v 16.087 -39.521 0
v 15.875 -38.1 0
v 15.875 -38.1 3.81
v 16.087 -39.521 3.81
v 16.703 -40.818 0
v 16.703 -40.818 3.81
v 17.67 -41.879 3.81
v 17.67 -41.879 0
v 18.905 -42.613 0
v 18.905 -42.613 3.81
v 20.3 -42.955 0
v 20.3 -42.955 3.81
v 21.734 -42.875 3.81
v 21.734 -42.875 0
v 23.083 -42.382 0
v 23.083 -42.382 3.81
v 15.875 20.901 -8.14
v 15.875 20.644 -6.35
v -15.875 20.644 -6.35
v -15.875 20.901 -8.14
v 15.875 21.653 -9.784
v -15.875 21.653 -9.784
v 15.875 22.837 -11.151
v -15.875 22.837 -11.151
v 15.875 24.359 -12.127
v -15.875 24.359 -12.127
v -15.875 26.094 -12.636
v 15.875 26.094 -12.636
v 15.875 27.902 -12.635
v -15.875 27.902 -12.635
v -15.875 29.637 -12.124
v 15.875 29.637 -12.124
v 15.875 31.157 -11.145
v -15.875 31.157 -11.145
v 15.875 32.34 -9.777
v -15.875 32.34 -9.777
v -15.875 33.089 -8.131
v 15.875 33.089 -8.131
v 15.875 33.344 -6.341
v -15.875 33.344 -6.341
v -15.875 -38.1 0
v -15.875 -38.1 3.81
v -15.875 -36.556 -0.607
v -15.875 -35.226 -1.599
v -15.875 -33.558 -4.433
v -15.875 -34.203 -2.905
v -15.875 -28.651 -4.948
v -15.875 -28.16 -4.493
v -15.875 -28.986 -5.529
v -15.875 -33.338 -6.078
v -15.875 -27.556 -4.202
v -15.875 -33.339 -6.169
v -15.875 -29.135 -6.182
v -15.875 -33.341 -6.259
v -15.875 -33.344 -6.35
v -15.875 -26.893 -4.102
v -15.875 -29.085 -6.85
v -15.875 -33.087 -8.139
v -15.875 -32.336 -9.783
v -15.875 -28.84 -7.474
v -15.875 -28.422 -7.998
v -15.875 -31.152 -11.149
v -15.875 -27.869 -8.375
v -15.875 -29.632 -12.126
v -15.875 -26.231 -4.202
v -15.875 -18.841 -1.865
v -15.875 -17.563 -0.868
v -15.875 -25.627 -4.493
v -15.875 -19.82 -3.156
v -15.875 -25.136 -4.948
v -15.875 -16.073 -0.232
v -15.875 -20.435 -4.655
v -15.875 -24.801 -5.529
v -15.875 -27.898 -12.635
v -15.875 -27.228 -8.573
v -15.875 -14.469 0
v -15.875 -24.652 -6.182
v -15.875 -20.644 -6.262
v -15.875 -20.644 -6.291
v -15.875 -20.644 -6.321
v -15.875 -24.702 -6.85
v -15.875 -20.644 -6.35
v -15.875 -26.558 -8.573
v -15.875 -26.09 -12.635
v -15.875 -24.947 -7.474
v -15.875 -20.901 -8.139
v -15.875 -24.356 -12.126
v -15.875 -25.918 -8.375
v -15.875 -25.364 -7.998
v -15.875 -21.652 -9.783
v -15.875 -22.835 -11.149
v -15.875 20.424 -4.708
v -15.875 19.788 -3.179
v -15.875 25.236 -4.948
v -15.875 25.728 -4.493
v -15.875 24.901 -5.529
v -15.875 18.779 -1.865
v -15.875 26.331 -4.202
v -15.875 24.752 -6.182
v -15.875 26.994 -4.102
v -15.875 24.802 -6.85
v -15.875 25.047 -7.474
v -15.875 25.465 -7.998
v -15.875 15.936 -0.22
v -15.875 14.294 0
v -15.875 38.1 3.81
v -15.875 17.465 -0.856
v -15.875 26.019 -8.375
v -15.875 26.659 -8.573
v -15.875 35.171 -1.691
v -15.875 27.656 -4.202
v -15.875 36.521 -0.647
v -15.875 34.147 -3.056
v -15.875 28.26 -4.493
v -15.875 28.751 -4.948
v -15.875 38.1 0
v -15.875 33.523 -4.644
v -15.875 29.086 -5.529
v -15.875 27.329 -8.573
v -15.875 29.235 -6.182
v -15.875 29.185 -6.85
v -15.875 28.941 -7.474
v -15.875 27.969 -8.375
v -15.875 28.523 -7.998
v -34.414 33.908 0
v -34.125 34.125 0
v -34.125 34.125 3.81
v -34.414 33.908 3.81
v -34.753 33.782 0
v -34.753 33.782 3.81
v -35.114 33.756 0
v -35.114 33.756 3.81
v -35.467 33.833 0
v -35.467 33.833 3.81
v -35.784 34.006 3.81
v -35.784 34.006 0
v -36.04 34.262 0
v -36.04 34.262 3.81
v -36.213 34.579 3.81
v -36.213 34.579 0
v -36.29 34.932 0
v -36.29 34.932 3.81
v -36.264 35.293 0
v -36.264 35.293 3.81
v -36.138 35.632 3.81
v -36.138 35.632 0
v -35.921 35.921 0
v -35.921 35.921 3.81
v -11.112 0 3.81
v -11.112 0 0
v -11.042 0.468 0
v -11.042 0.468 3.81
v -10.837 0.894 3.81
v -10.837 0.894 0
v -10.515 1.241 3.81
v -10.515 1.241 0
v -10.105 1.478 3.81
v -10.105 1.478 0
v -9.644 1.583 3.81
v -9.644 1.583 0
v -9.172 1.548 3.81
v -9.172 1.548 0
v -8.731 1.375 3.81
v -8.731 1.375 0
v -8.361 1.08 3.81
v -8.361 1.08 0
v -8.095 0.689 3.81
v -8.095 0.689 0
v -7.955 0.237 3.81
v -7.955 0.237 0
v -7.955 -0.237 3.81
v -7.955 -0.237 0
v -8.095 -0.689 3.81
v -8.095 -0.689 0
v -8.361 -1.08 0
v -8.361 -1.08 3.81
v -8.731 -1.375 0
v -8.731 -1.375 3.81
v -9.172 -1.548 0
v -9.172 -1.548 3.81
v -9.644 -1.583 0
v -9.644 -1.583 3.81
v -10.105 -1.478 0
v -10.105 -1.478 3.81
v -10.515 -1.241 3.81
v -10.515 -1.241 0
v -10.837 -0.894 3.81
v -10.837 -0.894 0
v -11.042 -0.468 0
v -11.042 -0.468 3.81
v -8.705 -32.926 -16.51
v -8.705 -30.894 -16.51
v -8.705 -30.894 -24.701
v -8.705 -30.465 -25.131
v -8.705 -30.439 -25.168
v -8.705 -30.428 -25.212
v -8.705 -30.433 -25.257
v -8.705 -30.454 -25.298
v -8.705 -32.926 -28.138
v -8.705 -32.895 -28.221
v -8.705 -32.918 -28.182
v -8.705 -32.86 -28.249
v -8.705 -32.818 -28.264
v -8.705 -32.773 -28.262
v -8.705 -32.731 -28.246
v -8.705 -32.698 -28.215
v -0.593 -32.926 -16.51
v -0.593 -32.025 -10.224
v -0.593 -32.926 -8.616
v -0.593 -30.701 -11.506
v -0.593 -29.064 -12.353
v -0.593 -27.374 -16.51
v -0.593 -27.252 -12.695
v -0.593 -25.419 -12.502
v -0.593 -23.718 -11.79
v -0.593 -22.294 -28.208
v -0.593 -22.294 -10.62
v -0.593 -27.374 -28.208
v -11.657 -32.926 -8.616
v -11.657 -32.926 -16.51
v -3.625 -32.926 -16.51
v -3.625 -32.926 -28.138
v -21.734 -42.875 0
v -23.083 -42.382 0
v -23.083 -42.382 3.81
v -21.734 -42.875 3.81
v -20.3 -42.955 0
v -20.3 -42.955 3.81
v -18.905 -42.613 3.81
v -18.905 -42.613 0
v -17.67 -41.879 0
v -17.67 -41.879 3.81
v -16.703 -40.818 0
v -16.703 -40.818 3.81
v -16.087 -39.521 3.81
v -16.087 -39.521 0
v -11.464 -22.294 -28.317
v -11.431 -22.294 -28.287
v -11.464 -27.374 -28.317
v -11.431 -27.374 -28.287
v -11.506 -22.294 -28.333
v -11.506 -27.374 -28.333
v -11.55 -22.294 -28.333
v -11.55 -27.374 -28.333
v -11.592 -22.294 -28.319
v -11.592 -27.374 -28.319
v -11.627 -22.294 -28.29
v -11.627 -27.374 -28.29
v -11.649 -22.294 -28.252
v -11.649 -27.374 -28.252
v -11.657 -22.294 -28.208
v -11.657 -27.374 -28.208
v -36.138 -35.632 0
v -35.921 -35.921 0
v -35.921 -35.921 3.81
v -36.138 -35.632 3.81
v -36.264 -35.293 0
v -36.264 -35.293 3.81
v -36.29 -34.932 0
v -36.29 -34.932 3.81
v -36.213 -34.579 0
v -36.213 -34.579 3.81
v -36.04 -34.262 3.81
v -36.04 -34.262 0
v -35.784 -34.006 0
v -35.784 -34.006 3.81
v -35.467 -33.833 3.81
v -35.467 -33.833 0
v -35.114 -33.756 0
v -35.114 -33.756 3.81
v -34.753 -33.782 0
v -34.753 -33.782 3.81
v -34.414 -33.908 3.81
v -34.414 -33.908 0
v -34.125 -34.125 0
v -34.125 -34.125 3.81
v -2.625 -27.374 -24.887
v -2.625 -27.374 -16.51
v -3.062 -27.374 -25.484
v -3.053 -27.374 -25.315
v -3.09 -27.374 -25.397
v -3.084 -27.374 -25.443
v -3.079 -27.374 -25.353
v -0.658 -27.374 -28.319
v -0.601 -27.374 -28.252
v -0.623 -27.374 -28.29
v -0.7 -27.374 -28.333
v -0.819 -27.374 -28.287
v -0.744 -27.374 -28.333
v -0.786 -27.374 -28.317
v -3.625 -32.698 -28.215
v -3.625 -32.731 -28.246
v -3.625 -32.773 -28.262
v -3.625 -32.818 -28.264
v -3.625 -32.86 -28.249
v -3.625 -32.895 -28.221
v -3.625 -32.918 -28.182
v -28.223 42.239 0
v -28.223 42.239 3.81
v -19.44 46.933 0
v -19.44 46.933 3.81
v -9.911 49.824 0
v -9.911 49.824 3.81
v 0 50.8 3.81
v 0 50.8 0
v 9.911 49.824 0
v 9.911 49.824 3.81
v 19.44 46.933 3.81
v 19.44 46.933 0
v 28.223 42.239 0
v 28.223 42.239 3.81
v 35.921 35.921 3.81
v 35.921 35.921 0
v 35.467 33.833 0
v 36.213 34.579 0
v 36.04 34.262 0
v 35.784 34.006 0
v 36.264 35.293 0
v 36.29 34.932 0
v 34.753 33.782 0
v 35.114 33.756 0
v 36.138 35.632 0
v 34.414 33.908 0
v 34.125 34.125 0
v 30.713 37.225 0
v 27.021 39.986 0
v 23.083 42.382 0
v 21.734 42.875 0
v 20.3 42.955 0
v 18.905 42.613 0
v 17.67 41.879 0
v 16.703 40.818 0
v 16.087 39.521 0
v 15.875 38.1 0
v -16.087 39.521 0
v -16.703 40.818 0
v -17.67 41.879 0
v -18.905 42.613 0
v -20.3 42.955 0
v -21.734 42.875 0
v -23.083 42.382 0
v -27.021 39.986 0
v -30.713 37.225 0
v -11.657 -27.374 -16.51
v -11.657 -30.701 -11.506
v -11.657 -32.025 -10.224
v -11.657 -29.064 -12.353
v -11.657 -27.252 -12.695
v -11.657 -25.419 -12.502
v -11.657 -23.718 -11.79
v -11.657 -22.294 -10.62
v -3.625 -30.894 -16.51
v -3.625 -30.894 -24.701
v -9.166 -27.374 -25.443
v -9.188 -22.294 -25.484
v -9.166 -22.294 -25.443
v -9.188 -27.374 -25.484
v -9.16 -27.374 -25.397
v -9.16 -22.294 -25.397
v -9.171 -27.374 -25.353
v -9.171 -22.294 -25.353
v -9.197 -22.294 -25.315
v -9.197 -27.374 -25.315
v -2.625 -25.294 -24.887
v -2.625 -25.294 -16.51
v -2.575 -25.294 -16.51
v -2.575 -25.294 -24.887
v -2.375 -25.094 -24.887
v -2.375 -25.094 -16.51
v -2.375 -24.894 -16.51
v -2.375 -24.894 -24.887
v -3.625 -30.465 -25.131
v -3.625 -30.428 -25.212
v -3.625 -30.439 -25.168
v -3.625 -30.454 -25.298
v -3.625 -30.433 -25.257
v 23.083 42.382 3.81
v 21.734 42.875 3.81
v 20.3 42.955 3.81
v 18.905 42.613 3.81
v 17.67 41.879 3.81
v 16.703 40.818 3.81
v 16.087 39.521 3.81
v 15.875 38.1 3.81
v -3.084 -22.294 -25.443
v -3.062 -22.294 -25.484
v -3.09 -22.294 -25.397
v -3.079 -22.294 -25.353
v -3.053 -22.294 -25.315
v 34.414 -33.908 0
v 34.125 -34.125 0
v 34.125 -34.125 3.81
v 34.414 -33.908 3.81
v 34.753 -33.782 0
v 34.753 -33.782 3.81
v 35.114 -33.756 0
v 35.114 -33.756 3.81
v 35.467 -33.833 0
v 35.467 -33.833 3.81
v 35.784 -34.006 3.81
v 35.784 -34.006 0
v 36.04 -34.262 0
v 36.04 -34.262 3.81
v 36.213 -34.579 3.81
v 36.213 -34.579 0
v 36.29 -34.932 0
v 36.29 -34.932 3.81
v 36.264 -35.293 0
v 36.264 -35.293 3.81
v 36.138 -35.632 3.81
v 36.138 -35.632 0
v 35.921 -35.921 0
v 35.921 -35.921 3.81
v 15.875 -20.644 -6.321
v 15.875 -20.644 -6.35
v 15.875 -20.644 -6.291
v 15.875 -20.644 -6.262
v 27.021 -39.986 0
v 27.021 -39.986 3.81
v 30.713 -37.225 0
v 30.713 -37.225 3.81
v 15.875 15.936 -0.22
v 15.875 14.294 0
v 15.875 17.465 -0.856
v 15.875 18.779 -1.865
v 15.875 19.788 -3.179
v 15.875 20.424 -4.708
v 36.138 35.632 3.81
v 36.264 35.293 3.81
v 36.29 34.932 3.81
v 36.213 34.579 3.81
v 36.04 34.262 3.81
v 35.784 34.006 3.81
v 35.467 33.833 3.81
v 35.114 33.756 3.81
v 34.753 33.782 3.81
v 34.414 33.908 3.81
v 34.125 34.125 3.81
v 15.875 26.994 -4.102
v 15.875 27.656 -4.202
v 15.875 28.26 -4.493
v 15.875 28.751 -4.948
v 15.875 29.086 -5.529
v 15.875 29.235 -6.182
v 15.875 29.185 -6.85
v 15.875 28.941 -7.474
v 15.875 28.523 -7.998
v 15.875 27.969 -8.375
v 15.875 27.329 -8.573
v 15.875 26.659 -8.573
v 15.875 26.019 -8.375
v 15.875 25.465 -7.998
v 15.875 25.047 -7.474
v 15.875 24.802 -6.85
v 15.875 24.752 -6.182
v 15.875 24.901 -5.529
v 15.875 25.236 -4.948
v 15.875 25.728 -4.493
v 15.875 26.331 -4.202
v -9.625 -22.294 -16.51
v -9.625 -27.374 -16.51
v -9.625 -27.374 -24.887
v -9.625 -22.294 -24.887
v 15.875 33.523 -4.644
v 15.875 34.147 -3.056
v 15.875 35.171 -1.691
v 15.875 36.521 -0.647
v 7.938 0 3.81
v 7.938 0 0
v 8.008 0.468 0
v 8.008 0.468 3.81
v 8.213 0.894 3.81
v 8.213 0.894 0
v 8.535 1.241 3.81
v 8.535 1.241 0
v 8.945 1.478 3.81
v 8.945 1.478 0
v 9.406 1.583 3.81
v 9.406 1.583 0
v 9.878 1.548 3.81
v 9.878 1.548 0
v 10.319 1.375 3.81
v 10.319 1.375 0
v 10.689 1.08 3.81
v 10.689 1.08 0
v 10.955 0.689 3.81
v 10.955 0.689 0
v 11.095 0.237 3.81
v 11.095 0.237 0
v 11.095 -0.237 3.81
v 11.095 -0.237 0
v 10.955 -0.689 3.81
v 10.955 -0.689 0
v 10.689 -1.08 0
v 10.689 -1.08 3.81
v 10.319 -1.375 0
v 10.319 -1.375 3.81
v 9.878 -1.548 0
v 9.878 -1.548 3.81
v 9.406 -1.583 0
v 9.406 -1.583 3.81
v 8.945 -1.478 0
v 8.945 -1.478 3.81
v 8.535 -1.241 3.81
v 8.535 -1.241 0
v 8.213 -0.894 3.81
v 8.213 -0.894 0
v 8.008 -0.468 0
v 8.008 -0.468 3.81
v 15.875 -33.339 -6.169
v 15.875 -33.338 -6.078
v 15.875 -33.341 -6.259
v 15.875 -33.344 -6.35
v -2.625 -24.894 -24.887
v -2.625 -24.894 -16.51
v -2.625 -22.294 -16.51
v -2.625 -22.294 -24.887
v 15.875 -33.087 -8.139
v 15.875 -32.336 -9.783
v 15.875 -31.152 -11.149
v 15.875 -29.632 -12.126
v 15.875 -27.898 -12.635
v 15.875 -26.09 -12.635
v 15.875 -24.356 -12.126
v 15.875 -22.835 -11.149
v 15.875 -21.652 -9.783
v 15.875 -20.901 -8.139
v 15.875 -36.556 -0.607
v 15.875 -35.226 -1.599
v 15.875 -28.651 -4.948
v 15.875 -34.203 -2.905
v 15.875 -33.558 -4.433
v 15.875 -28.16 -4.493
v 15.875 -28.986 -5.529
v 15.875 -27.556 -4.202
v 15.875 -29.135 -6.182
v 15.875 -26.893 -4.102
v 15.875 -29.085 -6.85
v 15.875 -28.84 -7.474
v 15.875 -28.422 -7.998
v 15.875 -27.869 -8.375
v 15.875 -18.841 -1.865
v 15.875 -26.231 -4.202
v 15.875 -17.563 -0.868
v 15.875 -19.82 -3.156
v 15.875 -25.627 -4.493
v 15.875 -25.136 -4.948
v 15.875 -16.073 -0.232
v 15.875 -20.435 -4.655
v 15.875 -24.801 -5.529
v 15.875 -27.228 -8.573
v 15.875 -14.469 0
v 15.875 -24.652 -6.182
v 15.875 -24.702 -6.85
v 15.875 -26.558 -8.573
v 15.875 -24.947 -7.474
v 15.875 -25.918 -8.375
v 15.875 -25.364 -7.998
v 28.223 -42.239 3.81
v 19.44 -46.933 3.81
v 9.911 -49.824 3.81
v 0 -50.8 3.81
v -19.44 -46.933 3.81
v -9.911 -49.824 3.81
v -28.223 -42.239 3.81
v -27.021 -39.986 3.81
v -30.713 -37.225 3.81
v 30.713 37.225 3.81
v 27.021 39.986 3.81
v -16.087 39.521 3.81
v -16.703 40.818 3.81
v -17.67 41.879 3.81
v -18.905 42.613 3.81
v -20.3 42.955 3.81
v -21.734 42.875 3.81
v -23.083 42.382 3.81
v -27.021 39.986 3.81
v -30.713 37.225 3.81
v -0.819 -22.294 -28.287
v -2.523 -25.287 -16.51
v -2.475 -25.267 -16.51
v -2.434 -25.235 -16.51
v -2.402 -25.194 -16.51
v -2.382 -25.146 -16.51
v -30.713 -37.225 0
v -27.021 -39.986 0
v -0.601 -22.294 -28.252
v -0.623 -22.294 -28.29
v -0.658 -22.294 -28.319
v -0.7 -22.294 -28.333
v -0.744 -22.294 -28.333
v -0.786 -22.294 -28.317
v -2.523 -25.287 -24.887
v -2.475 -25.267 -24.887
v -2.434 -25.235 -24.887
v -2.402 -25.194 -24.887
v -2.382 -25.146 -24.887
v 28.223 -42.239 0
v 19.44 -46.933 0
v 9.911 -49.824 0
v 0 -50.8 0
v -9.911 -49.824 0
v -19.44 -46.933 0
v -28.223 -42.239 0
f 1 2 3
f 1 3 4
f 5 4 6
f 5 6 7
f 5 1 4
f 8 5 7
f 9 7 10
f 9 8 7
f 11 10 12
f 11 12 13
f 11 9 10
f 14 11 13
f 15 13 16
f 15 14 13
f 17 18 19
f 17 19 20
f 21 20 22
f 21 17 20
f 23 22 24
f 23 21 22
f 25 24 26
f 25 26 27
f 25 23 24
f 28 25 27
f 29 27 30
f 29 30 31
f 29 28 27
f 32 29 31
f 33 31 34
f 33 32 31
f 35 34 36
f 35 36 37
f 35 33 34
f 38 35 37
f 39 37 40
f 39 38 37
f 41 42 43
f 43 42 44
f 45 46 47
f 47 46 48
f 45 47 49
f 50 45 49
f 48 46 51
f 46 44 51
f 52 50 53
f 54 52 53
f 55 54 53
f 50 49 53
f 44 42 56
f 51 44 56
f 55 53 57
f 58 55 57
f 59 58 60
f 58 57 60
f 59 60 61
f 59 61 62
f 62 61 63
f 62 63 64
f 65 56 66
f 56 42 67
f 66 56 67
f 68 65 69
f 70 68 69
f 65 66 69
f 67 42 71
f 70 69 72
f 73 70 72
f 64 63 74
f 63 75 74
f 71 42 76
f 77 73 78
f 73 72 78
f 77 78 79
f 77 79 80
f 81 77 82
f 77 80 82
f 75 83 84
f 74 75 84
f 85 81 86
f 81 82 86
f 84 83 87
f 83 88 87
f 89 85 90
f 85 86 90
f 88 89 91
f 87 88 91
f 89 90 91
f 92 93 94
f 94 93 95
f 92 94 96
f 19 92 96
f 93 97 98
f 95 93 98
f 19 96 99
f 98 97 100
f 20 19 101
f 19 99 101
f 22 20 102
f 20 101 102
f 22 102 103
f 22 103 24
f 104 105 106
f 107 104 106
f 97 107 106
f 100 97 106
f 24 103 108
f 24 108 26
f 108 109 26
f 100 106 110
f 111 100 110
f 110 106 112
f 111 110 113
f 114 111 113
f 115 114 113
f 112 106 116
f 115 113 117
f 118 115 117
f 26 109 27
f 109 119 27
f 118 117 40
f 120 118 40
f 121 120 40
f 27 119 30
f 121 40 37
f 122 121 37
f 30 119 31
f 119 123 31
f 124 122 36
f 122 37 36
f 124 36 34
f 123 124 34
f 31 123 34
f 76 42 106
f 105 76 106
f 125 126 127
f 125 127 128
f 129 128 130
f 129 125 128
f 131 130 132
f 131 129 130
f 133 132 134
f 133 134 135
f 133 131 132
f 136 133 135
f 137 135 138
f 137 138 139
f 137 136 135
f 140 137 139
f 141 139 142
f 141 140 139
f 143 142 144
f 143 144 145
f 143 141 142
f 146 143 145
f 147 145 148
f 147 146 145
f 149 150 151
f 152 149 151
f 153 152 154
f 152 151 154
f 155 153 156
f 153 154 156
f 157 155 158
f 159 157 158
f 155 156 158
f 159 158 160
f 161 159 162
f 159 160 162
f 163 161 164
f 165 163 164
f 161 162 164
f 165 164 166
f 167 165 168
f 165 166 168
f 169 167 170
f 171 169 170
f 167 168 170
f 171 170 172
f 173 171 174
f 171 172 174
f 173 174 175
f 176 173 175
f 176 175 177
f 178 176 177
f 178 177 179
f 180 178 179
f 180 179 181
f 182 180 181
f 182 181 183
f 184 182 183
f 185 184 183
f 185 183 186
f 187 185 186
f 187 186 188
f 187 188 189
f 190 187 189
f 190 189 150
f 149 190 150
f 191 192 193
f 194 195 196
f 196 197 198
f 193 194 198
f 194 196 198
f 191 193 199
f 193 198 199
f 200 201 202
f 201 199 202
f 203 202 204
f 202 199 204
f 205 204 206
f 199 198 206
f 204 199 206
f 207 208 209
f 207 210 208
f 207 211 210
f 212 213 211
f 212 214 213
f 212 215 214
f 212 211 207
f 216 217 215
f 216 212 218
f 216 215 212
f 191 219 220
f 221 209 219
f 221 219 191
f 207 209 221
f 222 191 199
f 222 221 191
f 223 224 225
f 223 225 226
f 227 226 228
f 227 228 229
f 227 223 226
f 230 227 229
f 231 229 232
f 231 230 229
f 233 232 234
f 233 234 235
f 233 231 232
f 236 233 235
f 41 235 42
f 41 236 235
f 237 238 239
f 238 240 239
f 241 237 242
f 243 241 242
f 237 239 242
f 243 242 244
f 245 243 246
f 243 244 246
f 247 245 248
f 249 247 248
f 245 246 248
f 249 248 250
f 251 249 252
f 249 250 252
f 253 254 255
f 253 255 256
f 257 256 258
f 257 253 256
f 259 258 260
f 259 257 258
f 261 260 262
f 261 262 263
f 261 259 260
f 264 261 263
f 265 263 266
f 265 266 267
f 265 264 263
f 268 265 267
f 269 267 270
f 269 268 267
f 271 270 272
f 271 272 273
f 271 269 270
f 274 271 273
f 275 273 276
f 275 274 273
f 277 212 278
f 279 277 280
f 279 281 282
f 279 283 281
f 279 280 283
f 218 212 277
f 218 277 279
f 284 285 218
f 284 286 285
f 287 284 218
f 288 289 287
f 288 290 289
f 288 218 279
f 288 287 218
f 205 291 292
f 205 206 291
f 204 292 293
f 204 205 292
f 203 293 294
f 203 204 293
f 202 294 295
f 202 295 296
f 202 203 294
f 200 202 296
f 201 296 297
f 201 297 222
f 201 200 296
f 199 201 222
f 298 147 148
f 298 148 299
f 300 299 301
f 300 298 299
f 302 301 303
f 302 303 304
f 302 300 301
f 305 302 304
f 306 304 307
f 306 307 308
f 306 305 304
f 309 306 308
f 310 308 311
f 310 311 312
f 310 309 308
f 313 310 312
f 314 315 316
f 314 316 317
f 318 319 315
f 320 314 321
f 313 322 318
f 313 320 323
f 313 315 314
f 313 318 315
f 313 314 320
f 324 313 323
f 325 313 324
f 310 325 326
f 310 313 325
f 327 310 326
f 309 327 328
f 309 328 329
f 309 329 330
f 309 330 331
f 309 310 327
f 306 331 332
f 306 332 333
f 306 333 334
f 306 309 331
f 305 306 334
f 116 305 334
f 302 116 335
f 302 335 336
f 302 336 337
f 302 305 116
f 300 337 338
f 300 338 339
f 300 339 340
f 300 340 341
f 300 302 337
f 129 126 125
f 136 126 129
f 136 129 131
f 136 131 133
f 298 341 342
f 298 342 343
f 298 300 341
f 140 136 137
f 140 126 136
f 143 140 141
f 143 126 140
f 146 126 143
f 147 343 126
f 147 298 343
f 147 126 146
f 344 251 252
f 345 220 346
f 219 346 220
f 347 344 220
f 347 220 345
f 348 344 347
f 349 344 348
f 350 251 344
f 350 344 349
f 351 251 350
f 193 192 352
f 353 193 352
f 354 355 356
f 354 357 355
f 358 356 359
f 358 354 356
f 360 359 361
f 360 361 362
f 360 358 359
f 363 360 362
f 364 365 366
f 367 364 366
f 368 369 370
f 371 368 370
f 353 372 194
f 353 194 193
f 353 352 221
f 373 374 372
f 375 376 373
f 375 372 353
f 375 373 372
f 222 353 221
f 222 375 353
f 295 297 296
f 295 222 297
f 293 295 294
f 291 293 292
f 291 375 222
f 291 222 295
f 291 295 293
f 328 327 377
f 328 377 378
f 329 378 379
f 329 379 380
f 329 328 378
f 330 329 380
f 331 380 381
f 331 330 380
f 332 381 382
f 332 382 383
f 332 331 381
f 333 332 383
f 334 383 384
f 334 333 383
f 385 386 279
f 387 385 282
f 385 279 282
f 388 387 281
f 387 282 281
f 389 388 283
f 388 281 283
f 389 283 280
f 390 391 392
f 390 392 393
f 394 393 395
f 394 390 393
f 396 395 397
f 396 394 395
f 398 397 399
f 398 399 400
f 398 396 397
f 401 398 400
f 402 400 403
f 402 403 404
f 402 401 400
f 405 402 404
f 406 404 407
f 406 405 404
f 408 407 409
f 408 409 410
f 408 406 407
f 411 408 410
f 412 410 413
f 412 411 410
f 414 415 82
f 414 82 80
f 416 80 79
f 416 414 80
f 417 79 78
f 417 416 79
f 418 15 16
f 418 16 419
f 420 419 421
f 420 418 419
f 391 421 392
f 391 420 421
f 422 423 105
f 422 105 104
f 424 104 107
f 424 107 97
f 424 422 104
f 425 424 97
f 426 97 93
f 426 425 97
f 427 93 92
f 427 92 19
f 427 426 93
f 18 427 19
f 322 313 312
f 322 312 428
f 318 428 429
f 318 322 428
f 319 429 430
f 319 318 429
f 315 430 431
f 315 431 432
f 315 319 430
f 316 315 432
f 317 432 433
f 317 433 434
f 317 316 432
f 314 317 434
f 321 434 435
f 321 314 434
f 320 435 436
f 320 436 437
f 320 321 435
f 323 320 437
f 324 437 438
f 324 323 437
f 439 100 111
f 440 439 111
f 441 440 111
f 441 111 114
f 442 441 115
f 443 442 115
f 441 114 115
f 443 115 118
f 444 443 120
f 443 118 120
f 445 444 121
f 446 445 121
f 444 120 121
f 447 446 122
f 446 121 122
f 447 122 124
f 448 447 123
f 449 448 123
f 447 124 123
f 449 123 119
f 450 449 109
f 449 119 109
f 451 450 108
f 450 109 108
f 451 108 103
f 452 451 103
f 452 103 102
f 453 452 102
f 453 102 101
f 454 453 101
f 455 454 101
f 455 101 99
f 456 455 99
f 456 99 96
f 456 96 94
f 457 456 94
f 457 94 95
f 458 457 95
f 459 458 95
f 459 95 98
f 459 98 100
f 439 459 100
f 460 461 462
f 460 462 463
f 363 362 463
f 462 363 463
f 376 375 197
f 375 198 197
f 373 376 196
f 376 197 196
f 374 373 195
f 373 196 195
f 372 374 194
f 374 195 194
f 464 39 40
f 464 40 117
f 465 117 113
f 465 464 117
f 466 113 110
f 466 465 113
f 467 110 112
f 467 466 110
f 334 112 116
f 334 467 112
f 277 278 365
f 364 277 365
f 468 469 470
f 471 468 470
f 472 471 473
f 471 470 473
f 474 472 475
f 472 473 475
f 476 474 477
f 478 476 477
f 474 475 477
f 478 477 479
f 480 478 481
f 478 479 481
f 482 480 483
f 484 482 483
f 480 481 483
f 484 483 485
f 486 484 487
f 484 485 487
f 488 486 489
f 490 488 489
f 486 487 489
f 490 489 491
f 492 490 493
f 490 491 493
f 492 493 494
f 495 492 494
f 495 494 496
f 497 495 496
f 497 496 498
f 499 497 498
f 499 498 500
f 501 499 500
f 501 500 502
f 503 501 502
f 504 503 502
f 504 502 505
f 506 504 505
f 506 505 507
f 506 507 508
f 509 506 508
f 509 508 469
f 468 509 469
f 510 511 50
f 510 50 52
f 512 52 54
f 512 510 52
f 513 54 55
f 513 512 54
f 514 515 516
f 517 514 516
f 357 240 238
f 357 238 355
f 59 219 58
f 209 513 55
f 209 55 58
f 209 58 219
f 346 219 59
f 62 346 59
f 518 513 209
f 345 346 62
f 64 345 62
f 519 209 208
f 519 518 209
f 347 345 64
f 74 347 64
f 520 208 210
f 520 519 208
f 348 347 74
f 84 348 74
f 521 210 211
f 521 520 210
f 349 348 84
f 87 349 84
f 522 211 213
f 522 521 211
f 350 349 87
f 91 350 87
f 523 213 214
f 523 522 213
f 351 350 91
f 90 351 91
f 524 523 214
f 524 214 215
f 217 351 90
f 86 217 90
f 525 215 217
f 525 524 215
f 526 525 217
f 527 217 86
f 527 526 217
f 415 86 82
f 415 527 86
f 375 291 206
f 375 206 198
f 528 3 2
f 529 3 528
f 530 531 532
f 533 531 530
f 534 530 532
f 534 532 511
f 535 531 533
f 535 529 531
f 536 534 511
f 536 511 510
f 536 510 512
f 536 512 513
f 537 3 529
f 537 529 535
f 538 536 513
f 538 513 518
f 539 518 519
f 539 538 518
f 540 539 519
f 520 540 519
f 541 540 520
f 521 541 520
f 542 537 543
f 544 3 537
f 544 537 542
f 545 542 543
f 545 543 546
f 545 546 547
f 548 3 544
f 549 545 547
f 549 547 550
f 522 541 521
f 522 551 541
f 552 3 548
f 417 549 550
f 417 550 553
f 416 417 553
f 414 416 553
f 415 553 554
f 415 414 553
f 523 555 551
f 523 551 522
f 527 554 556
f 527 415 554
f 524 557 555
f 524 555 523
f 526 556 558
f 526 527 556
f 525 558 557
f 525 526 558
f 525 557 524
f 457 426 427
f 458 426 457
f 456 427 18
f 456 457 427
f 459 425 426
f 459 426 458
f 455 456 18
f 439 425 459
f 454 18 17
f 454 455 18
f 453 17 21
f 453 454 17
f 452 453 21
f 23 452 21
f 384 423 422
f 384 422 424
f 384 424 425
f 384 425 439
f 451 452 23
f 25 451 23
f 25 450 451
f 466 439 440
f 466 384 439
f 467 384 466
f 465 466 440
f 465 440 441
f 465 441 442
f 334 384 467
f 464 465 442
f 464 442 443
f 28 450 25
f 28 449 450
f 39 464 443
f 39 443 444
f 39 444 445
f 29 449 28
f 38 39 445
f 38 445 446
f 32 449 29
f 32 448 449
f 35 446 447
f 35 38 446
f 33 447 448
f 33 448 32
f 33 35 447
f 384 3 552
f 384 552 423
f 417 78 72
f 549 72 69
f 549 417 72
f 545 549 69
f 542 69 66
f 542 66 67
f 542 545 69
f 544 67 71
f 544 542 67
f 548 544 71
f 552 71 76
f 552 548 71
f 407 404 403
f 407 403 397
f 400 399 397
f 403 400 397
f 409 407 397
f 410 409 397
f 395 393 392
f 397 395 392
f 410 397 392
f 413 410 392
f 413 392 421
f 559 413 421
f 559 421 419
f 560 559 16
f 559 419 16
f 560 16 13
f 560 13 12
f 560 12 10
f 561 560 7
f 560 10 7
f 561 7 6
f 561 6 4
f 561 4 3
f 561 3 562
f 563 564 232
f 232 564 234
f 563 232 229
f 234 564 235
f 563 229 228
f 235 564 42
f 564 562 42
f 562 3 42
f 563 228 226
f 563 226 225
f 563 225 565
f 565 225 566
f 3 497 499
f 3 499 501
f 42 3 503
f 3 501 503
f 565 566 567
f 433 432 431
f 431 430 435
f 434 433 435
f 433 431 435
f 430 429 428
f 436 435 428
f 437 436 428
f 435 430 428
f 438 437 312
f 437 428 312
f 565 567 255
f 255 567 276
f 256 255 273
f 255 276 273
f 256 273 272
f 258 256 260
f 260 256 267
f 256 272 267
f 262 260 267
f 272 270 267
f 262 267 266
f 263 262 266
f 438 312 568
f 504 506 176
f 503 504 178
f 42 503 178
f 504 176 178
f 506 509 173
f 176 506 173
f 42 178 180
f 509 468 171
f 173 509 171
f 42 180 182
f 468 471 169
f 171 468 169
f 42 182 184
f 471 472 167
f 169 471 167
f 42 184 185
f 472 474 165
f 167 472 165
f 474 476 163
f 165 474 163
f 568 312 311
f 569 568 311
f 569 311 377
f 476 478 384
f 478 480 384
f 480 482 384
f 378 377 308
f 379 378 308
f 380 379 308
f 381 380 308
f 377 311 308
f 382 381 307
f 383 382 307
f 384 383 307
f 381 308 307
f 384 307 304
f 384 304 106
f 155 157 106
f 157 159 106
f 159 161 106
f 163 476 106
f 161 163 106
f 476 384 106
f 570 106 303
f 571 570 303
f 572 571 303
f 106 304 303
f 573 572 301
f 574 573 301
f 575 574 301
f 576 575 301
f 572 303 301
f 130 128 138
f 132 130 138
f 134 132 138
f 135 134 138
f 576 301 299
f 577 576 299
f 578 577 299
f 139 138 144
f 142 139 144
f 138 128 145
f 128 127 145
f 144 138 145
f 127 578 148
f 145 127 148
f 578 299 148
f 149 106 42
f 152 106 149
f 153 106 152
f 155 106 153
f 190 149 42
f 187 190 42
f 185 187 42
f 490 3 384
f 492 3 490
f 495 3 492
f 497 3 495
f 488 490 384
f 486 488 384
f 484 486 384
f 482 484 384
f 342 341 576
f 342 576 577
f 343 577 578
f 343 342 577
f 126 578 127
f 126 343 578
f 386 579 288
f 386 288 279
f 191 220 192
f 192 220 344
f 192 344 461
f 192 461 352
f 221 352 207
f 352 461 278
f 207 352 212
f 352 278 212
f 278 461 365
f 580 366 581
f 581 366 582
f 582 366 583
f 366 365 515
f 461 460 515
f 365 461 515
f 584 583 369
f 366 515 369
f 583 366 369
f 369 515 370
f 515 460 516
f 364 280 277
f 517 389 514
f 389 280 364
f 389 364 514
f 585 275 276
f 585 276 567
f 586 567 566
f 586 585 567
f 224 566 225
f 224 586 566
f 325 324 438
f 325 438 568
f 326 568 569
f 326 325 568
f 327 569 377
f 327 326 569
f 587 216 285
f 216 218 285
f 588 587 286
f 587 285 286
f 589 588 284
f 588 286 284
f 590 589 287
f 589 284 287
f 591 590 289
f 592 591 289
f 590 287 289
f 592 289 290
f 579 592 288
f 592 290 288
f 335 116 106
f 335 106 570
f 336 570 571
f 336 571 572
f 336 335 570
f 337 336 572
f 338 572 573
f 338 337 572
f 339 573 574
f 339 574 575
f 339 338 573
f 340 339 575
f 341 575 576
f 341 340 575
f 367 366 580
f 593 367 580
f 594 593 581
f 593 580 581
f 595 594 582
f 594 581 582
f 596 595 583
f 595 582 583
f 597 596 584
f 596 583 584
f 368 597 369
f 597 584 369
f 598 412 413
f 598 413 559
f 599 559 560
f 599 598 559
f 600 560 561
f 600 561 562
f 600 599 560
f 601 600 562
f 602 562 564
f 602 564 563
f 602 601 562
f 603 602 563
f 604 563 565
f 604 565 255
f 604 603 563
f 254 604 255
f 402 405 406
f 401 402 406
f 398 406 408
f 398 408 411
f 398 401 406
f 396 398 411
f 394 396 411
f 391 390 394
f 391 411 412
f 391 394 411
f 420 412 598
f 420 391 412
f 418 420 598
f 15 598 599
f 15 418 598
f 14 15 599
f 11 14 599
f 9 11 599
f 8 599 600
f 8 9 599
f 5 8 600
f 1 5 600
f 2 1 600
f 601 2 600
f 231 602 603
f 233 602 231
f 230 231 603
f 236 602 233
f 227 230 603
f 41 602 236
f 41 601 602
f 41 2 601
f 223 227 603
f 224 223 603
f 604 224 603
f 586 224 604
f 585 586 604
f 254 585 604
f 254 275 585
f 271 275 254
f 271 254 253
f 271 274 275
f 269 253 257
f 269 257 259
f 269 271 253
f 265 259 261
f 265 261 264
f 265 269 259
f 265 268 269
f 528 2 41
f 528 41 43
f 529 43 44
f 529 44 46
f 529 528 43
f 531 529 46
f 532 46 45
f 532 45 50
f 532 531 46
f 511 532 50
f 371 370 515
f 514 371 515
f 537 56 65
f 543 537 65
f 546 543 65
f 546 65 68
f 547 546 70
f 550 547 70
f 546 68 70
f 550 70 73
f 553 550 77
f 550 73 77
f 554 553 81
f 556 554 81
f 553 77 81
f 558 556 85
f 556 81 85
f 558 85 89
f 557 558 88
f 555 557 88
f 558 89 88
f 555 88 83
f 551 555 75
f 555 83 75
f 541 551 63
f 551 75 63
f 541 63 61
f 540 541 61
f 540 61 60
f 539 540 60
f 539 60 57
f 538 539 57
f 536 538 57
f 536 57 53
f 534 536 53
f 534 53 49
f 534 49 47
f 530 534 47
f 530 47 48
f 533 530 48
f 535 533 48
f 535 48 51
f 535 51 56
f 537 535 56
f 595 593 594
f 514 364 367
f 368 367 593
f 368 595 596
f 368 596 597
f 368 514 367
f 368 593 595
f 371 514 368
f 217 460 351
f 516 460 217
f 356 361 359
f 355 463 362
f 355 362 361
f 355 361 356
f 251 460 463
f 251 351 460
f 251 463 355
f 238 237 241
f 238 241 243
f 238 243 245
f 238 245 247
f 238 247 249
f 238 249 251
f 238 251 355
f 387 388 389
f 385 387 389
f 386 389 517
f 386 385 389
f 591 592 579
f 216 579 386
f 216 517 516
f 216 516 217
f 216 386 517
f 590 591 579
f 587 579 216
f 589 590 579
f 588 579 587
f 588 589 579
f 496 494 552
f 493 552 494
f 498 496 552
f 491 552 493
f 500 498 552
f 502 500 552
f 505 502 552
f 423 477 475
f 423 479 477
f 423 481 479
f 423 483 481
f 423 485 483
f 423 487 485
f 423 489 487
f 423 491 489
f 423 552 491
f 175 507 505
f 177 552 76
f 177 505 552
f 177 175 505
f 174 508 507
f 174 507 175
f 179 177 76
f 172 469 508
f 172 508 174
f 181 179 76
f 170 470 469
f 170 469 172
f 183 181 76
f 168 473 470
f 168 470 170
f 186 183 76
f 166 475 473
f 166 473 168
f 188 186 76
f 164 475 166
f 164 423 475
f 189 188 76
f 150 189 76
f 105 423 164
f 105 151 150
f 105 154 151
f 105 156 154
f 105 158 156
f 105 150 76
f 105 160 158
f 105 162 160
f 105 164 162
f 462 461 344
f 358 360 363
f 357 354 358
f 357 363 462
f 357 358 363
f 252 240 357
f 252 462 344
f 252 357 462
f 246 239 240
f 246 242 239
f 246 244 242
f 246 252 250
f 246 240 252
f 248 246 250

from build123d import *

# Parameters (mm, degrees)
BOSS_EXTRUDE2_DEPTH                 = 3.81
BOSS_EXTRUDE4_DEPTH                 = 31.75
F_8_CLEARANCE_HOLE1_D               = 4.4958
PARACHUTE_SHROUD_HOLE_LOW_PROFILE_D = 3.175
MONOFILAMENT_HOLE_LOW_PROFILE_D     = 3.175
BOSS_EXTRUDE7_REACH                 = 67.656
SKETCH21_W                          = 2.032
SKETCH21_H                          = 5.08
SKETCH21_W_2                        = 5.08
SKETCH21_H_2                        = 2.032
SKETCH22_W                          = 11.064
SKETCH22_H                          = 10.632
BOSS_EXTRUDE8_DEPTH                 = 7.894195
BOSS_EXTRUDE9_REACH                 = 87.468
BOSS_EXTRUDE10_DEPTH                = 5.08
FILLET3_R                           = 0.127


with BuildPart() as part:
    # Sketch3 → Boss-Extrude2 (new body)
    with BuildSketch(Plane.XY):
        with BuildLine():
            Line((-15.875, -38.1), (-15.875, 38.1))
            ThreePointArc((-15.875, 38.1), (-18.260491841, 42.291797068), (-23.082694008, 42.38179842))
            ThreePointArc((-23.082694008, 42.38179842), (-28.900226452, 38.649767283), (-34.12497326, 34.12497326))
            ThreePointArc((-34.12497326, 34.12497326), (-35.921024484, 34.12497326), (-35.921024484, 35.921024484))
            ThreePointArc((-35.921024484, 35.921024484), (0, 50.8), (35.921024484, 35.921024484))
            ThreePointArc((35.921024484, 35.921024484), (35.921024484, 34.12497326), (34.12497326, 34.12497326))
            ThreePointArc((34.12497326, 34.12497326), (28.900226452, 38.649767283), (23.082694008, 42.38179842))
            ThreePointArc((23.082694008, 42.38179842), (18.260491841, 42.291797068), (15.875, 38.1))
            Line((15.875, 38.1), (15.875, -38.1))
            ThreePointArc((15.875, -38.1), (18.260491841, -42.291797068), (23.082694008, -42.38179842))
            ThreePointArc((23.082694008, -42.38179842), (28.900226452, -38.649767283), (34.12497326, -34.12497326))
            ThreePointArc((34.12497326, -34.12497326), (35.921024484, -34.12497326), (35.921024484, -35.921024484))
            ThreePointArc((35.921024484, -35.921024484), (0, -50.8), (-35.921024484, -35.921024484))
            ThreePointArc((-35.921024484, -35.921024484), (-35.921024484, -34.12497326), (-34.12497326, -34.12497326))
            ThreePointArc((-34.12497326, -34.12497326), (-28.900226452, -38.649767283), (-23.082694008, -42.38179842))
            ThreePointArc((-23.082694008, -42.38179842), (-18.260491841, -42.291797068), (-15.875, -38.1))
        make_face()
    extrude(amount=BOSS_EXTRUDE2_DEPTH)

    # Sketch5 → Boss-Extrude4 (add)
    with BuildSketch(Plane(origin=(15.875, 0, 0), x_dir=(0, 0, -1), z_dir=(1, 0, 0))):
        with BuildLine():
            Line((0, 38.1), (0, 26.99385))
            Line((0, 26.99385), (0, 14.29385))
            ThreePointArc((0, 14.29385), (1.86498297, 18.77886703), (6.35, 20.64385))
            ThreePointArc((6.35, 20.64385), (12.699998494, 26.998224058), (6.341251887, 33.343843974))
            ThreePointArc((6.341251887, 33.343843974), (2.338844583, 34.612930799), (0, 38.1))
        make_face()
        with BuildLine():
            ThreePointArc((6.261703048, -20.644463916), (1.864650947, -18.840779739), (0, -14.469233029))
            Line((0, -14.469233029), (0, -26.99385))
            Line((0, -26.99385), (0, -38.1))
            ThreePointArc((0, -38.1), (2.217611083, -34.670801888), (6.077775616, -33.338012189))
            ThreePointArc((6.077775616, -33.338012189), (6.213919542, -33.33945129), (6.35, -33.34385))
            ThreePointArc((6.35, -33.34385), (12.7, -26.99385), (6.35, -20.64385))
            ThreePointArc((6.35, -20.64385), (6.305852606, -20.644312569), (6.261703048, -20.644463916))
        make_face()
    extrude(amount=-BOSS_EXTRUDE4_DEPTH)

    # 8 Clearance Hole1 (through all)
    with Locations(Plane(origin=(15.875, 0, 0), x_dir=(0, 0, -1), z_dir=(1, 0, 0))):
        with Locations((6.35, 26.99385), (6.35, -26.893399733)):
            Hole(F_8_CLEARANCE_HOLE1_D / 2)

    # Parachute shroud hole _low profile (through all)
    with Locations(Plane.XY.offset(3.81)):
        with Locations((-9.525, 0)):
            Hole(PARACHUTE_SHROUD_HOLE_LOW_PROFILE_D / 2)

    # Monofilament hole _low profile (through all)
    with Locations(Plane.XY.offset(3.81)):
        with Locations((9.525, 0)):
            Hole(MONOFILAMENT_HOLE_LOW_PROFILE_D / 2)



with BuildPart() as body_2:
    # Boss-Extrude7: up to this plane
    boss_extrude7_end = Plane(origin=(-1.6499976, -20.290855187, -25.429913438), z_dir=(0, 0.01745240643728808, 0.9998476951563912))
    # Sketch21 → Boss-Extrude7 (new, up to the surface)
    with BuildSketch(Plane.XY.offset(-16.509739), mode=Mode.PRIVATE) as boss_extrude7_sk1:
        with BuildLine():
            Line((-2.625, -22.293950072), (-0.593, -22.293950072))
            Line((-0.593, -22.293950072), (-0.593, -27.373950072))
            Line((-0.593, -27.373950072), (-2.625, -27.373950072))
            Line((-2.625, -27.373950072), (-2.625, -25.293950072))
            Line((-2.625, -25.293950072), (-2.575, -25.293950072))
            ThreePointArc((-2.575, -25.293950072), (-2.433578644, -25.235371429), (-2.375, -25.093950072))
            Line((-2.375, -25.093950072), (-2.375, -24.893950072))
            Line((-2.375, -24.893950072), (-2.625, -24.893950072))
            Line((-2.625, -24.893950072), (-2.625, -22.293950072))
        make_face()
    boss_extrude7_tool1 = split(extrude(boss_extrude7_sk1.sketch, amount=-BOSS_EXTRUDE7_REACH, mode=Mode.PRIVATE), bisect_by=boss_extrude7_end, keep=Keep.BOTH, mode=Mode.PRIVATE)
    add(boss_extrude7_tool1.solids().sort_by_distance((-1.600971, -24.831757, -16.509739))[0])
    # Sketch21 → Boss-Extrude7 (new, up to the surface)
    with BuildSketch(Plane.XY.offset(-16.509739), mode=Mode.PRIVATE) as boss_extrude7_sk2:
        with Locations((-10.641, -24.833950072)):
            Rectangle(SKETCH21_W, SKETCH21_H)
    boss_extrude7_tool2 = split(extrude(boss_extrude7_sk2.sketch, amount=-BOSS_EXTRUDE7_REACH, mode=Mode.PRIVATE), bisect_by=boss_extrude7_end, keep=Keep.BOTH, mode=Mode.PRIVATE)
    add(boss_extrude7_tool2.solids().sort_by_distance((-10.641, -24.83395, -16.509739))[0])
    # Sketch21 → Boss-Extrude7 (new, up to the surface)
    with BuildSketch(Plane.XY.offset(-16.509739), mode=Mode.PRIVATE) as boss_extrude7_sk3:
        with Locations((-6.165, -31.909950072)):
            Rectangle(SKETCH21_W_2, SKETCH21_H_2)
    boss_extrude7_tool3 = split(extrude(boss_extrude7_sk3.sketch, amount=-BOSS_EXTRUDE7_REACH, mode=Mode.PRIVATE), bisect_by=boss_extrude7_end, keep=Keep.BOTH, mode=Mode.PRIVATE)
    add(boss_extrude7_tool3.solids().sort_by_distance((-6.165, -31.90995, -16.509739))[0])


with BuildPart() as part_1:
    add(part.part)

    add(body_2.part)  # Boss-Extrude8 merges body 2
    # Sketch22 → Boss-Extrude8 (add)
    with BuildSketch(Plane.XY.offset(-16.509739)):
        with Locations((-6.125, -27.609950072)):
            Rectangle(SKETCH22_W, SKETCH22_H)
    extrude(amount=BOSS_EXTRUDE8_DEPTH)

    # Boss-Extrude9: up to this face of the body (flat: up to its plane)
    boss_extrude9_end = Plane(part_1.part.faces().sort_by_distance((-1.609, -27.373950072, -20.908008278))[0])
    # Sketch23 → Boss-Extrude9 (add, up to the picked face)
    with BuildSketch(Plane(origin=(0, -22.293950072, 0), x_dir=(1, 0, 0), z_dir=(0, 1, 0)), mode=Mode.PRIVATE) as boss_extrude9_sk1:
        Polygon((-11.657, 25.394949287), (-11.657, 28.569949287), (-9.117, 25.394949287), (-9.625, 24.886949287), (-11.657, 24.886949287), align=None)
    boss_extrude9_tool1 = split(extrude(boss_extrude9_sk1.sketch, amount=-BOSS_EXTRUDE9_REACH, mode=Mode.PRIVATE), bisect_by=boss_extrude9_end, keep=Keep.BOTH, mode=Mode.PRIVATE)
    # Sketch23 → Boss-Extrude9 (add, up to the picked face)
    with BuildSketch(Plane(origin=(0, -22.293950072, 0), x_dir=(1, 0, 0), z_dir=(0, 1, 0)), mode=Mode.PRIVATE) as boss_extrude9_sk2:
        Polygon((-0.593, 25.394949287), (-0.593, 28.569949287), (-3.133, 25.394949287), (-2.625, 24.886949287), (-0.593, 24.886949287), align=None)
    boss_extrude9_tool2 = split(extrude(boss_extrude9_sk2.sketch, amount=-BOSS_EXTRUDE9_REACH, mode=Mode.PRIVATE), bisect_by=boss_extrude9_end, keep=Keep.BOTH, mode=Mode.PRIVATE)
    add(boss_extrude9_tool1.solids().sort_by(Axis((-10.743021, -22.29395, -26.161945), (0, -1, 0)))[0])
    add(boss_extrude9_tool2.solids().sort_by(Axis((-1.506979, -22.29395, -26.161945), (0, -1, 0)))[0])

    # Sketch25 → Boss-Extrude10 (add)
    with BuildSketch(Plane(origin=(-3.625, 0, 0), x_dir=(0, 0, -1), z_dir=(1, 0, 0))):
        Polygon((25.209367036, -32.925950072), (28.511367036, -32.925950072), (25.209367036, -30.385950072), (24.701367036, -30.893950072), (24.701367036, -32.925950072), align=None)
    extrude(amount=-BOSS_EXTRUDE10_DEPTH)

    # Fillet3
    fillet3_edges = [part_1.edges().sort_by_distance(p)[0] for p in [
        (-9.117, -24.833950072, -25.394949287),
        (-11.657, -24.833950072, -28.569949287),
        (-0.593, -24.833950072, -28.569949287),
        (-3.133, -24.833950072, -25.394949287),
        (-6.165, -32.925950072, -28.511367036),
        (-6.165, -30.385950072, -25.209367036),
    ]]
    fillet(fillet3_edges, radius=FILLET3_R)


solid = part_1.part
